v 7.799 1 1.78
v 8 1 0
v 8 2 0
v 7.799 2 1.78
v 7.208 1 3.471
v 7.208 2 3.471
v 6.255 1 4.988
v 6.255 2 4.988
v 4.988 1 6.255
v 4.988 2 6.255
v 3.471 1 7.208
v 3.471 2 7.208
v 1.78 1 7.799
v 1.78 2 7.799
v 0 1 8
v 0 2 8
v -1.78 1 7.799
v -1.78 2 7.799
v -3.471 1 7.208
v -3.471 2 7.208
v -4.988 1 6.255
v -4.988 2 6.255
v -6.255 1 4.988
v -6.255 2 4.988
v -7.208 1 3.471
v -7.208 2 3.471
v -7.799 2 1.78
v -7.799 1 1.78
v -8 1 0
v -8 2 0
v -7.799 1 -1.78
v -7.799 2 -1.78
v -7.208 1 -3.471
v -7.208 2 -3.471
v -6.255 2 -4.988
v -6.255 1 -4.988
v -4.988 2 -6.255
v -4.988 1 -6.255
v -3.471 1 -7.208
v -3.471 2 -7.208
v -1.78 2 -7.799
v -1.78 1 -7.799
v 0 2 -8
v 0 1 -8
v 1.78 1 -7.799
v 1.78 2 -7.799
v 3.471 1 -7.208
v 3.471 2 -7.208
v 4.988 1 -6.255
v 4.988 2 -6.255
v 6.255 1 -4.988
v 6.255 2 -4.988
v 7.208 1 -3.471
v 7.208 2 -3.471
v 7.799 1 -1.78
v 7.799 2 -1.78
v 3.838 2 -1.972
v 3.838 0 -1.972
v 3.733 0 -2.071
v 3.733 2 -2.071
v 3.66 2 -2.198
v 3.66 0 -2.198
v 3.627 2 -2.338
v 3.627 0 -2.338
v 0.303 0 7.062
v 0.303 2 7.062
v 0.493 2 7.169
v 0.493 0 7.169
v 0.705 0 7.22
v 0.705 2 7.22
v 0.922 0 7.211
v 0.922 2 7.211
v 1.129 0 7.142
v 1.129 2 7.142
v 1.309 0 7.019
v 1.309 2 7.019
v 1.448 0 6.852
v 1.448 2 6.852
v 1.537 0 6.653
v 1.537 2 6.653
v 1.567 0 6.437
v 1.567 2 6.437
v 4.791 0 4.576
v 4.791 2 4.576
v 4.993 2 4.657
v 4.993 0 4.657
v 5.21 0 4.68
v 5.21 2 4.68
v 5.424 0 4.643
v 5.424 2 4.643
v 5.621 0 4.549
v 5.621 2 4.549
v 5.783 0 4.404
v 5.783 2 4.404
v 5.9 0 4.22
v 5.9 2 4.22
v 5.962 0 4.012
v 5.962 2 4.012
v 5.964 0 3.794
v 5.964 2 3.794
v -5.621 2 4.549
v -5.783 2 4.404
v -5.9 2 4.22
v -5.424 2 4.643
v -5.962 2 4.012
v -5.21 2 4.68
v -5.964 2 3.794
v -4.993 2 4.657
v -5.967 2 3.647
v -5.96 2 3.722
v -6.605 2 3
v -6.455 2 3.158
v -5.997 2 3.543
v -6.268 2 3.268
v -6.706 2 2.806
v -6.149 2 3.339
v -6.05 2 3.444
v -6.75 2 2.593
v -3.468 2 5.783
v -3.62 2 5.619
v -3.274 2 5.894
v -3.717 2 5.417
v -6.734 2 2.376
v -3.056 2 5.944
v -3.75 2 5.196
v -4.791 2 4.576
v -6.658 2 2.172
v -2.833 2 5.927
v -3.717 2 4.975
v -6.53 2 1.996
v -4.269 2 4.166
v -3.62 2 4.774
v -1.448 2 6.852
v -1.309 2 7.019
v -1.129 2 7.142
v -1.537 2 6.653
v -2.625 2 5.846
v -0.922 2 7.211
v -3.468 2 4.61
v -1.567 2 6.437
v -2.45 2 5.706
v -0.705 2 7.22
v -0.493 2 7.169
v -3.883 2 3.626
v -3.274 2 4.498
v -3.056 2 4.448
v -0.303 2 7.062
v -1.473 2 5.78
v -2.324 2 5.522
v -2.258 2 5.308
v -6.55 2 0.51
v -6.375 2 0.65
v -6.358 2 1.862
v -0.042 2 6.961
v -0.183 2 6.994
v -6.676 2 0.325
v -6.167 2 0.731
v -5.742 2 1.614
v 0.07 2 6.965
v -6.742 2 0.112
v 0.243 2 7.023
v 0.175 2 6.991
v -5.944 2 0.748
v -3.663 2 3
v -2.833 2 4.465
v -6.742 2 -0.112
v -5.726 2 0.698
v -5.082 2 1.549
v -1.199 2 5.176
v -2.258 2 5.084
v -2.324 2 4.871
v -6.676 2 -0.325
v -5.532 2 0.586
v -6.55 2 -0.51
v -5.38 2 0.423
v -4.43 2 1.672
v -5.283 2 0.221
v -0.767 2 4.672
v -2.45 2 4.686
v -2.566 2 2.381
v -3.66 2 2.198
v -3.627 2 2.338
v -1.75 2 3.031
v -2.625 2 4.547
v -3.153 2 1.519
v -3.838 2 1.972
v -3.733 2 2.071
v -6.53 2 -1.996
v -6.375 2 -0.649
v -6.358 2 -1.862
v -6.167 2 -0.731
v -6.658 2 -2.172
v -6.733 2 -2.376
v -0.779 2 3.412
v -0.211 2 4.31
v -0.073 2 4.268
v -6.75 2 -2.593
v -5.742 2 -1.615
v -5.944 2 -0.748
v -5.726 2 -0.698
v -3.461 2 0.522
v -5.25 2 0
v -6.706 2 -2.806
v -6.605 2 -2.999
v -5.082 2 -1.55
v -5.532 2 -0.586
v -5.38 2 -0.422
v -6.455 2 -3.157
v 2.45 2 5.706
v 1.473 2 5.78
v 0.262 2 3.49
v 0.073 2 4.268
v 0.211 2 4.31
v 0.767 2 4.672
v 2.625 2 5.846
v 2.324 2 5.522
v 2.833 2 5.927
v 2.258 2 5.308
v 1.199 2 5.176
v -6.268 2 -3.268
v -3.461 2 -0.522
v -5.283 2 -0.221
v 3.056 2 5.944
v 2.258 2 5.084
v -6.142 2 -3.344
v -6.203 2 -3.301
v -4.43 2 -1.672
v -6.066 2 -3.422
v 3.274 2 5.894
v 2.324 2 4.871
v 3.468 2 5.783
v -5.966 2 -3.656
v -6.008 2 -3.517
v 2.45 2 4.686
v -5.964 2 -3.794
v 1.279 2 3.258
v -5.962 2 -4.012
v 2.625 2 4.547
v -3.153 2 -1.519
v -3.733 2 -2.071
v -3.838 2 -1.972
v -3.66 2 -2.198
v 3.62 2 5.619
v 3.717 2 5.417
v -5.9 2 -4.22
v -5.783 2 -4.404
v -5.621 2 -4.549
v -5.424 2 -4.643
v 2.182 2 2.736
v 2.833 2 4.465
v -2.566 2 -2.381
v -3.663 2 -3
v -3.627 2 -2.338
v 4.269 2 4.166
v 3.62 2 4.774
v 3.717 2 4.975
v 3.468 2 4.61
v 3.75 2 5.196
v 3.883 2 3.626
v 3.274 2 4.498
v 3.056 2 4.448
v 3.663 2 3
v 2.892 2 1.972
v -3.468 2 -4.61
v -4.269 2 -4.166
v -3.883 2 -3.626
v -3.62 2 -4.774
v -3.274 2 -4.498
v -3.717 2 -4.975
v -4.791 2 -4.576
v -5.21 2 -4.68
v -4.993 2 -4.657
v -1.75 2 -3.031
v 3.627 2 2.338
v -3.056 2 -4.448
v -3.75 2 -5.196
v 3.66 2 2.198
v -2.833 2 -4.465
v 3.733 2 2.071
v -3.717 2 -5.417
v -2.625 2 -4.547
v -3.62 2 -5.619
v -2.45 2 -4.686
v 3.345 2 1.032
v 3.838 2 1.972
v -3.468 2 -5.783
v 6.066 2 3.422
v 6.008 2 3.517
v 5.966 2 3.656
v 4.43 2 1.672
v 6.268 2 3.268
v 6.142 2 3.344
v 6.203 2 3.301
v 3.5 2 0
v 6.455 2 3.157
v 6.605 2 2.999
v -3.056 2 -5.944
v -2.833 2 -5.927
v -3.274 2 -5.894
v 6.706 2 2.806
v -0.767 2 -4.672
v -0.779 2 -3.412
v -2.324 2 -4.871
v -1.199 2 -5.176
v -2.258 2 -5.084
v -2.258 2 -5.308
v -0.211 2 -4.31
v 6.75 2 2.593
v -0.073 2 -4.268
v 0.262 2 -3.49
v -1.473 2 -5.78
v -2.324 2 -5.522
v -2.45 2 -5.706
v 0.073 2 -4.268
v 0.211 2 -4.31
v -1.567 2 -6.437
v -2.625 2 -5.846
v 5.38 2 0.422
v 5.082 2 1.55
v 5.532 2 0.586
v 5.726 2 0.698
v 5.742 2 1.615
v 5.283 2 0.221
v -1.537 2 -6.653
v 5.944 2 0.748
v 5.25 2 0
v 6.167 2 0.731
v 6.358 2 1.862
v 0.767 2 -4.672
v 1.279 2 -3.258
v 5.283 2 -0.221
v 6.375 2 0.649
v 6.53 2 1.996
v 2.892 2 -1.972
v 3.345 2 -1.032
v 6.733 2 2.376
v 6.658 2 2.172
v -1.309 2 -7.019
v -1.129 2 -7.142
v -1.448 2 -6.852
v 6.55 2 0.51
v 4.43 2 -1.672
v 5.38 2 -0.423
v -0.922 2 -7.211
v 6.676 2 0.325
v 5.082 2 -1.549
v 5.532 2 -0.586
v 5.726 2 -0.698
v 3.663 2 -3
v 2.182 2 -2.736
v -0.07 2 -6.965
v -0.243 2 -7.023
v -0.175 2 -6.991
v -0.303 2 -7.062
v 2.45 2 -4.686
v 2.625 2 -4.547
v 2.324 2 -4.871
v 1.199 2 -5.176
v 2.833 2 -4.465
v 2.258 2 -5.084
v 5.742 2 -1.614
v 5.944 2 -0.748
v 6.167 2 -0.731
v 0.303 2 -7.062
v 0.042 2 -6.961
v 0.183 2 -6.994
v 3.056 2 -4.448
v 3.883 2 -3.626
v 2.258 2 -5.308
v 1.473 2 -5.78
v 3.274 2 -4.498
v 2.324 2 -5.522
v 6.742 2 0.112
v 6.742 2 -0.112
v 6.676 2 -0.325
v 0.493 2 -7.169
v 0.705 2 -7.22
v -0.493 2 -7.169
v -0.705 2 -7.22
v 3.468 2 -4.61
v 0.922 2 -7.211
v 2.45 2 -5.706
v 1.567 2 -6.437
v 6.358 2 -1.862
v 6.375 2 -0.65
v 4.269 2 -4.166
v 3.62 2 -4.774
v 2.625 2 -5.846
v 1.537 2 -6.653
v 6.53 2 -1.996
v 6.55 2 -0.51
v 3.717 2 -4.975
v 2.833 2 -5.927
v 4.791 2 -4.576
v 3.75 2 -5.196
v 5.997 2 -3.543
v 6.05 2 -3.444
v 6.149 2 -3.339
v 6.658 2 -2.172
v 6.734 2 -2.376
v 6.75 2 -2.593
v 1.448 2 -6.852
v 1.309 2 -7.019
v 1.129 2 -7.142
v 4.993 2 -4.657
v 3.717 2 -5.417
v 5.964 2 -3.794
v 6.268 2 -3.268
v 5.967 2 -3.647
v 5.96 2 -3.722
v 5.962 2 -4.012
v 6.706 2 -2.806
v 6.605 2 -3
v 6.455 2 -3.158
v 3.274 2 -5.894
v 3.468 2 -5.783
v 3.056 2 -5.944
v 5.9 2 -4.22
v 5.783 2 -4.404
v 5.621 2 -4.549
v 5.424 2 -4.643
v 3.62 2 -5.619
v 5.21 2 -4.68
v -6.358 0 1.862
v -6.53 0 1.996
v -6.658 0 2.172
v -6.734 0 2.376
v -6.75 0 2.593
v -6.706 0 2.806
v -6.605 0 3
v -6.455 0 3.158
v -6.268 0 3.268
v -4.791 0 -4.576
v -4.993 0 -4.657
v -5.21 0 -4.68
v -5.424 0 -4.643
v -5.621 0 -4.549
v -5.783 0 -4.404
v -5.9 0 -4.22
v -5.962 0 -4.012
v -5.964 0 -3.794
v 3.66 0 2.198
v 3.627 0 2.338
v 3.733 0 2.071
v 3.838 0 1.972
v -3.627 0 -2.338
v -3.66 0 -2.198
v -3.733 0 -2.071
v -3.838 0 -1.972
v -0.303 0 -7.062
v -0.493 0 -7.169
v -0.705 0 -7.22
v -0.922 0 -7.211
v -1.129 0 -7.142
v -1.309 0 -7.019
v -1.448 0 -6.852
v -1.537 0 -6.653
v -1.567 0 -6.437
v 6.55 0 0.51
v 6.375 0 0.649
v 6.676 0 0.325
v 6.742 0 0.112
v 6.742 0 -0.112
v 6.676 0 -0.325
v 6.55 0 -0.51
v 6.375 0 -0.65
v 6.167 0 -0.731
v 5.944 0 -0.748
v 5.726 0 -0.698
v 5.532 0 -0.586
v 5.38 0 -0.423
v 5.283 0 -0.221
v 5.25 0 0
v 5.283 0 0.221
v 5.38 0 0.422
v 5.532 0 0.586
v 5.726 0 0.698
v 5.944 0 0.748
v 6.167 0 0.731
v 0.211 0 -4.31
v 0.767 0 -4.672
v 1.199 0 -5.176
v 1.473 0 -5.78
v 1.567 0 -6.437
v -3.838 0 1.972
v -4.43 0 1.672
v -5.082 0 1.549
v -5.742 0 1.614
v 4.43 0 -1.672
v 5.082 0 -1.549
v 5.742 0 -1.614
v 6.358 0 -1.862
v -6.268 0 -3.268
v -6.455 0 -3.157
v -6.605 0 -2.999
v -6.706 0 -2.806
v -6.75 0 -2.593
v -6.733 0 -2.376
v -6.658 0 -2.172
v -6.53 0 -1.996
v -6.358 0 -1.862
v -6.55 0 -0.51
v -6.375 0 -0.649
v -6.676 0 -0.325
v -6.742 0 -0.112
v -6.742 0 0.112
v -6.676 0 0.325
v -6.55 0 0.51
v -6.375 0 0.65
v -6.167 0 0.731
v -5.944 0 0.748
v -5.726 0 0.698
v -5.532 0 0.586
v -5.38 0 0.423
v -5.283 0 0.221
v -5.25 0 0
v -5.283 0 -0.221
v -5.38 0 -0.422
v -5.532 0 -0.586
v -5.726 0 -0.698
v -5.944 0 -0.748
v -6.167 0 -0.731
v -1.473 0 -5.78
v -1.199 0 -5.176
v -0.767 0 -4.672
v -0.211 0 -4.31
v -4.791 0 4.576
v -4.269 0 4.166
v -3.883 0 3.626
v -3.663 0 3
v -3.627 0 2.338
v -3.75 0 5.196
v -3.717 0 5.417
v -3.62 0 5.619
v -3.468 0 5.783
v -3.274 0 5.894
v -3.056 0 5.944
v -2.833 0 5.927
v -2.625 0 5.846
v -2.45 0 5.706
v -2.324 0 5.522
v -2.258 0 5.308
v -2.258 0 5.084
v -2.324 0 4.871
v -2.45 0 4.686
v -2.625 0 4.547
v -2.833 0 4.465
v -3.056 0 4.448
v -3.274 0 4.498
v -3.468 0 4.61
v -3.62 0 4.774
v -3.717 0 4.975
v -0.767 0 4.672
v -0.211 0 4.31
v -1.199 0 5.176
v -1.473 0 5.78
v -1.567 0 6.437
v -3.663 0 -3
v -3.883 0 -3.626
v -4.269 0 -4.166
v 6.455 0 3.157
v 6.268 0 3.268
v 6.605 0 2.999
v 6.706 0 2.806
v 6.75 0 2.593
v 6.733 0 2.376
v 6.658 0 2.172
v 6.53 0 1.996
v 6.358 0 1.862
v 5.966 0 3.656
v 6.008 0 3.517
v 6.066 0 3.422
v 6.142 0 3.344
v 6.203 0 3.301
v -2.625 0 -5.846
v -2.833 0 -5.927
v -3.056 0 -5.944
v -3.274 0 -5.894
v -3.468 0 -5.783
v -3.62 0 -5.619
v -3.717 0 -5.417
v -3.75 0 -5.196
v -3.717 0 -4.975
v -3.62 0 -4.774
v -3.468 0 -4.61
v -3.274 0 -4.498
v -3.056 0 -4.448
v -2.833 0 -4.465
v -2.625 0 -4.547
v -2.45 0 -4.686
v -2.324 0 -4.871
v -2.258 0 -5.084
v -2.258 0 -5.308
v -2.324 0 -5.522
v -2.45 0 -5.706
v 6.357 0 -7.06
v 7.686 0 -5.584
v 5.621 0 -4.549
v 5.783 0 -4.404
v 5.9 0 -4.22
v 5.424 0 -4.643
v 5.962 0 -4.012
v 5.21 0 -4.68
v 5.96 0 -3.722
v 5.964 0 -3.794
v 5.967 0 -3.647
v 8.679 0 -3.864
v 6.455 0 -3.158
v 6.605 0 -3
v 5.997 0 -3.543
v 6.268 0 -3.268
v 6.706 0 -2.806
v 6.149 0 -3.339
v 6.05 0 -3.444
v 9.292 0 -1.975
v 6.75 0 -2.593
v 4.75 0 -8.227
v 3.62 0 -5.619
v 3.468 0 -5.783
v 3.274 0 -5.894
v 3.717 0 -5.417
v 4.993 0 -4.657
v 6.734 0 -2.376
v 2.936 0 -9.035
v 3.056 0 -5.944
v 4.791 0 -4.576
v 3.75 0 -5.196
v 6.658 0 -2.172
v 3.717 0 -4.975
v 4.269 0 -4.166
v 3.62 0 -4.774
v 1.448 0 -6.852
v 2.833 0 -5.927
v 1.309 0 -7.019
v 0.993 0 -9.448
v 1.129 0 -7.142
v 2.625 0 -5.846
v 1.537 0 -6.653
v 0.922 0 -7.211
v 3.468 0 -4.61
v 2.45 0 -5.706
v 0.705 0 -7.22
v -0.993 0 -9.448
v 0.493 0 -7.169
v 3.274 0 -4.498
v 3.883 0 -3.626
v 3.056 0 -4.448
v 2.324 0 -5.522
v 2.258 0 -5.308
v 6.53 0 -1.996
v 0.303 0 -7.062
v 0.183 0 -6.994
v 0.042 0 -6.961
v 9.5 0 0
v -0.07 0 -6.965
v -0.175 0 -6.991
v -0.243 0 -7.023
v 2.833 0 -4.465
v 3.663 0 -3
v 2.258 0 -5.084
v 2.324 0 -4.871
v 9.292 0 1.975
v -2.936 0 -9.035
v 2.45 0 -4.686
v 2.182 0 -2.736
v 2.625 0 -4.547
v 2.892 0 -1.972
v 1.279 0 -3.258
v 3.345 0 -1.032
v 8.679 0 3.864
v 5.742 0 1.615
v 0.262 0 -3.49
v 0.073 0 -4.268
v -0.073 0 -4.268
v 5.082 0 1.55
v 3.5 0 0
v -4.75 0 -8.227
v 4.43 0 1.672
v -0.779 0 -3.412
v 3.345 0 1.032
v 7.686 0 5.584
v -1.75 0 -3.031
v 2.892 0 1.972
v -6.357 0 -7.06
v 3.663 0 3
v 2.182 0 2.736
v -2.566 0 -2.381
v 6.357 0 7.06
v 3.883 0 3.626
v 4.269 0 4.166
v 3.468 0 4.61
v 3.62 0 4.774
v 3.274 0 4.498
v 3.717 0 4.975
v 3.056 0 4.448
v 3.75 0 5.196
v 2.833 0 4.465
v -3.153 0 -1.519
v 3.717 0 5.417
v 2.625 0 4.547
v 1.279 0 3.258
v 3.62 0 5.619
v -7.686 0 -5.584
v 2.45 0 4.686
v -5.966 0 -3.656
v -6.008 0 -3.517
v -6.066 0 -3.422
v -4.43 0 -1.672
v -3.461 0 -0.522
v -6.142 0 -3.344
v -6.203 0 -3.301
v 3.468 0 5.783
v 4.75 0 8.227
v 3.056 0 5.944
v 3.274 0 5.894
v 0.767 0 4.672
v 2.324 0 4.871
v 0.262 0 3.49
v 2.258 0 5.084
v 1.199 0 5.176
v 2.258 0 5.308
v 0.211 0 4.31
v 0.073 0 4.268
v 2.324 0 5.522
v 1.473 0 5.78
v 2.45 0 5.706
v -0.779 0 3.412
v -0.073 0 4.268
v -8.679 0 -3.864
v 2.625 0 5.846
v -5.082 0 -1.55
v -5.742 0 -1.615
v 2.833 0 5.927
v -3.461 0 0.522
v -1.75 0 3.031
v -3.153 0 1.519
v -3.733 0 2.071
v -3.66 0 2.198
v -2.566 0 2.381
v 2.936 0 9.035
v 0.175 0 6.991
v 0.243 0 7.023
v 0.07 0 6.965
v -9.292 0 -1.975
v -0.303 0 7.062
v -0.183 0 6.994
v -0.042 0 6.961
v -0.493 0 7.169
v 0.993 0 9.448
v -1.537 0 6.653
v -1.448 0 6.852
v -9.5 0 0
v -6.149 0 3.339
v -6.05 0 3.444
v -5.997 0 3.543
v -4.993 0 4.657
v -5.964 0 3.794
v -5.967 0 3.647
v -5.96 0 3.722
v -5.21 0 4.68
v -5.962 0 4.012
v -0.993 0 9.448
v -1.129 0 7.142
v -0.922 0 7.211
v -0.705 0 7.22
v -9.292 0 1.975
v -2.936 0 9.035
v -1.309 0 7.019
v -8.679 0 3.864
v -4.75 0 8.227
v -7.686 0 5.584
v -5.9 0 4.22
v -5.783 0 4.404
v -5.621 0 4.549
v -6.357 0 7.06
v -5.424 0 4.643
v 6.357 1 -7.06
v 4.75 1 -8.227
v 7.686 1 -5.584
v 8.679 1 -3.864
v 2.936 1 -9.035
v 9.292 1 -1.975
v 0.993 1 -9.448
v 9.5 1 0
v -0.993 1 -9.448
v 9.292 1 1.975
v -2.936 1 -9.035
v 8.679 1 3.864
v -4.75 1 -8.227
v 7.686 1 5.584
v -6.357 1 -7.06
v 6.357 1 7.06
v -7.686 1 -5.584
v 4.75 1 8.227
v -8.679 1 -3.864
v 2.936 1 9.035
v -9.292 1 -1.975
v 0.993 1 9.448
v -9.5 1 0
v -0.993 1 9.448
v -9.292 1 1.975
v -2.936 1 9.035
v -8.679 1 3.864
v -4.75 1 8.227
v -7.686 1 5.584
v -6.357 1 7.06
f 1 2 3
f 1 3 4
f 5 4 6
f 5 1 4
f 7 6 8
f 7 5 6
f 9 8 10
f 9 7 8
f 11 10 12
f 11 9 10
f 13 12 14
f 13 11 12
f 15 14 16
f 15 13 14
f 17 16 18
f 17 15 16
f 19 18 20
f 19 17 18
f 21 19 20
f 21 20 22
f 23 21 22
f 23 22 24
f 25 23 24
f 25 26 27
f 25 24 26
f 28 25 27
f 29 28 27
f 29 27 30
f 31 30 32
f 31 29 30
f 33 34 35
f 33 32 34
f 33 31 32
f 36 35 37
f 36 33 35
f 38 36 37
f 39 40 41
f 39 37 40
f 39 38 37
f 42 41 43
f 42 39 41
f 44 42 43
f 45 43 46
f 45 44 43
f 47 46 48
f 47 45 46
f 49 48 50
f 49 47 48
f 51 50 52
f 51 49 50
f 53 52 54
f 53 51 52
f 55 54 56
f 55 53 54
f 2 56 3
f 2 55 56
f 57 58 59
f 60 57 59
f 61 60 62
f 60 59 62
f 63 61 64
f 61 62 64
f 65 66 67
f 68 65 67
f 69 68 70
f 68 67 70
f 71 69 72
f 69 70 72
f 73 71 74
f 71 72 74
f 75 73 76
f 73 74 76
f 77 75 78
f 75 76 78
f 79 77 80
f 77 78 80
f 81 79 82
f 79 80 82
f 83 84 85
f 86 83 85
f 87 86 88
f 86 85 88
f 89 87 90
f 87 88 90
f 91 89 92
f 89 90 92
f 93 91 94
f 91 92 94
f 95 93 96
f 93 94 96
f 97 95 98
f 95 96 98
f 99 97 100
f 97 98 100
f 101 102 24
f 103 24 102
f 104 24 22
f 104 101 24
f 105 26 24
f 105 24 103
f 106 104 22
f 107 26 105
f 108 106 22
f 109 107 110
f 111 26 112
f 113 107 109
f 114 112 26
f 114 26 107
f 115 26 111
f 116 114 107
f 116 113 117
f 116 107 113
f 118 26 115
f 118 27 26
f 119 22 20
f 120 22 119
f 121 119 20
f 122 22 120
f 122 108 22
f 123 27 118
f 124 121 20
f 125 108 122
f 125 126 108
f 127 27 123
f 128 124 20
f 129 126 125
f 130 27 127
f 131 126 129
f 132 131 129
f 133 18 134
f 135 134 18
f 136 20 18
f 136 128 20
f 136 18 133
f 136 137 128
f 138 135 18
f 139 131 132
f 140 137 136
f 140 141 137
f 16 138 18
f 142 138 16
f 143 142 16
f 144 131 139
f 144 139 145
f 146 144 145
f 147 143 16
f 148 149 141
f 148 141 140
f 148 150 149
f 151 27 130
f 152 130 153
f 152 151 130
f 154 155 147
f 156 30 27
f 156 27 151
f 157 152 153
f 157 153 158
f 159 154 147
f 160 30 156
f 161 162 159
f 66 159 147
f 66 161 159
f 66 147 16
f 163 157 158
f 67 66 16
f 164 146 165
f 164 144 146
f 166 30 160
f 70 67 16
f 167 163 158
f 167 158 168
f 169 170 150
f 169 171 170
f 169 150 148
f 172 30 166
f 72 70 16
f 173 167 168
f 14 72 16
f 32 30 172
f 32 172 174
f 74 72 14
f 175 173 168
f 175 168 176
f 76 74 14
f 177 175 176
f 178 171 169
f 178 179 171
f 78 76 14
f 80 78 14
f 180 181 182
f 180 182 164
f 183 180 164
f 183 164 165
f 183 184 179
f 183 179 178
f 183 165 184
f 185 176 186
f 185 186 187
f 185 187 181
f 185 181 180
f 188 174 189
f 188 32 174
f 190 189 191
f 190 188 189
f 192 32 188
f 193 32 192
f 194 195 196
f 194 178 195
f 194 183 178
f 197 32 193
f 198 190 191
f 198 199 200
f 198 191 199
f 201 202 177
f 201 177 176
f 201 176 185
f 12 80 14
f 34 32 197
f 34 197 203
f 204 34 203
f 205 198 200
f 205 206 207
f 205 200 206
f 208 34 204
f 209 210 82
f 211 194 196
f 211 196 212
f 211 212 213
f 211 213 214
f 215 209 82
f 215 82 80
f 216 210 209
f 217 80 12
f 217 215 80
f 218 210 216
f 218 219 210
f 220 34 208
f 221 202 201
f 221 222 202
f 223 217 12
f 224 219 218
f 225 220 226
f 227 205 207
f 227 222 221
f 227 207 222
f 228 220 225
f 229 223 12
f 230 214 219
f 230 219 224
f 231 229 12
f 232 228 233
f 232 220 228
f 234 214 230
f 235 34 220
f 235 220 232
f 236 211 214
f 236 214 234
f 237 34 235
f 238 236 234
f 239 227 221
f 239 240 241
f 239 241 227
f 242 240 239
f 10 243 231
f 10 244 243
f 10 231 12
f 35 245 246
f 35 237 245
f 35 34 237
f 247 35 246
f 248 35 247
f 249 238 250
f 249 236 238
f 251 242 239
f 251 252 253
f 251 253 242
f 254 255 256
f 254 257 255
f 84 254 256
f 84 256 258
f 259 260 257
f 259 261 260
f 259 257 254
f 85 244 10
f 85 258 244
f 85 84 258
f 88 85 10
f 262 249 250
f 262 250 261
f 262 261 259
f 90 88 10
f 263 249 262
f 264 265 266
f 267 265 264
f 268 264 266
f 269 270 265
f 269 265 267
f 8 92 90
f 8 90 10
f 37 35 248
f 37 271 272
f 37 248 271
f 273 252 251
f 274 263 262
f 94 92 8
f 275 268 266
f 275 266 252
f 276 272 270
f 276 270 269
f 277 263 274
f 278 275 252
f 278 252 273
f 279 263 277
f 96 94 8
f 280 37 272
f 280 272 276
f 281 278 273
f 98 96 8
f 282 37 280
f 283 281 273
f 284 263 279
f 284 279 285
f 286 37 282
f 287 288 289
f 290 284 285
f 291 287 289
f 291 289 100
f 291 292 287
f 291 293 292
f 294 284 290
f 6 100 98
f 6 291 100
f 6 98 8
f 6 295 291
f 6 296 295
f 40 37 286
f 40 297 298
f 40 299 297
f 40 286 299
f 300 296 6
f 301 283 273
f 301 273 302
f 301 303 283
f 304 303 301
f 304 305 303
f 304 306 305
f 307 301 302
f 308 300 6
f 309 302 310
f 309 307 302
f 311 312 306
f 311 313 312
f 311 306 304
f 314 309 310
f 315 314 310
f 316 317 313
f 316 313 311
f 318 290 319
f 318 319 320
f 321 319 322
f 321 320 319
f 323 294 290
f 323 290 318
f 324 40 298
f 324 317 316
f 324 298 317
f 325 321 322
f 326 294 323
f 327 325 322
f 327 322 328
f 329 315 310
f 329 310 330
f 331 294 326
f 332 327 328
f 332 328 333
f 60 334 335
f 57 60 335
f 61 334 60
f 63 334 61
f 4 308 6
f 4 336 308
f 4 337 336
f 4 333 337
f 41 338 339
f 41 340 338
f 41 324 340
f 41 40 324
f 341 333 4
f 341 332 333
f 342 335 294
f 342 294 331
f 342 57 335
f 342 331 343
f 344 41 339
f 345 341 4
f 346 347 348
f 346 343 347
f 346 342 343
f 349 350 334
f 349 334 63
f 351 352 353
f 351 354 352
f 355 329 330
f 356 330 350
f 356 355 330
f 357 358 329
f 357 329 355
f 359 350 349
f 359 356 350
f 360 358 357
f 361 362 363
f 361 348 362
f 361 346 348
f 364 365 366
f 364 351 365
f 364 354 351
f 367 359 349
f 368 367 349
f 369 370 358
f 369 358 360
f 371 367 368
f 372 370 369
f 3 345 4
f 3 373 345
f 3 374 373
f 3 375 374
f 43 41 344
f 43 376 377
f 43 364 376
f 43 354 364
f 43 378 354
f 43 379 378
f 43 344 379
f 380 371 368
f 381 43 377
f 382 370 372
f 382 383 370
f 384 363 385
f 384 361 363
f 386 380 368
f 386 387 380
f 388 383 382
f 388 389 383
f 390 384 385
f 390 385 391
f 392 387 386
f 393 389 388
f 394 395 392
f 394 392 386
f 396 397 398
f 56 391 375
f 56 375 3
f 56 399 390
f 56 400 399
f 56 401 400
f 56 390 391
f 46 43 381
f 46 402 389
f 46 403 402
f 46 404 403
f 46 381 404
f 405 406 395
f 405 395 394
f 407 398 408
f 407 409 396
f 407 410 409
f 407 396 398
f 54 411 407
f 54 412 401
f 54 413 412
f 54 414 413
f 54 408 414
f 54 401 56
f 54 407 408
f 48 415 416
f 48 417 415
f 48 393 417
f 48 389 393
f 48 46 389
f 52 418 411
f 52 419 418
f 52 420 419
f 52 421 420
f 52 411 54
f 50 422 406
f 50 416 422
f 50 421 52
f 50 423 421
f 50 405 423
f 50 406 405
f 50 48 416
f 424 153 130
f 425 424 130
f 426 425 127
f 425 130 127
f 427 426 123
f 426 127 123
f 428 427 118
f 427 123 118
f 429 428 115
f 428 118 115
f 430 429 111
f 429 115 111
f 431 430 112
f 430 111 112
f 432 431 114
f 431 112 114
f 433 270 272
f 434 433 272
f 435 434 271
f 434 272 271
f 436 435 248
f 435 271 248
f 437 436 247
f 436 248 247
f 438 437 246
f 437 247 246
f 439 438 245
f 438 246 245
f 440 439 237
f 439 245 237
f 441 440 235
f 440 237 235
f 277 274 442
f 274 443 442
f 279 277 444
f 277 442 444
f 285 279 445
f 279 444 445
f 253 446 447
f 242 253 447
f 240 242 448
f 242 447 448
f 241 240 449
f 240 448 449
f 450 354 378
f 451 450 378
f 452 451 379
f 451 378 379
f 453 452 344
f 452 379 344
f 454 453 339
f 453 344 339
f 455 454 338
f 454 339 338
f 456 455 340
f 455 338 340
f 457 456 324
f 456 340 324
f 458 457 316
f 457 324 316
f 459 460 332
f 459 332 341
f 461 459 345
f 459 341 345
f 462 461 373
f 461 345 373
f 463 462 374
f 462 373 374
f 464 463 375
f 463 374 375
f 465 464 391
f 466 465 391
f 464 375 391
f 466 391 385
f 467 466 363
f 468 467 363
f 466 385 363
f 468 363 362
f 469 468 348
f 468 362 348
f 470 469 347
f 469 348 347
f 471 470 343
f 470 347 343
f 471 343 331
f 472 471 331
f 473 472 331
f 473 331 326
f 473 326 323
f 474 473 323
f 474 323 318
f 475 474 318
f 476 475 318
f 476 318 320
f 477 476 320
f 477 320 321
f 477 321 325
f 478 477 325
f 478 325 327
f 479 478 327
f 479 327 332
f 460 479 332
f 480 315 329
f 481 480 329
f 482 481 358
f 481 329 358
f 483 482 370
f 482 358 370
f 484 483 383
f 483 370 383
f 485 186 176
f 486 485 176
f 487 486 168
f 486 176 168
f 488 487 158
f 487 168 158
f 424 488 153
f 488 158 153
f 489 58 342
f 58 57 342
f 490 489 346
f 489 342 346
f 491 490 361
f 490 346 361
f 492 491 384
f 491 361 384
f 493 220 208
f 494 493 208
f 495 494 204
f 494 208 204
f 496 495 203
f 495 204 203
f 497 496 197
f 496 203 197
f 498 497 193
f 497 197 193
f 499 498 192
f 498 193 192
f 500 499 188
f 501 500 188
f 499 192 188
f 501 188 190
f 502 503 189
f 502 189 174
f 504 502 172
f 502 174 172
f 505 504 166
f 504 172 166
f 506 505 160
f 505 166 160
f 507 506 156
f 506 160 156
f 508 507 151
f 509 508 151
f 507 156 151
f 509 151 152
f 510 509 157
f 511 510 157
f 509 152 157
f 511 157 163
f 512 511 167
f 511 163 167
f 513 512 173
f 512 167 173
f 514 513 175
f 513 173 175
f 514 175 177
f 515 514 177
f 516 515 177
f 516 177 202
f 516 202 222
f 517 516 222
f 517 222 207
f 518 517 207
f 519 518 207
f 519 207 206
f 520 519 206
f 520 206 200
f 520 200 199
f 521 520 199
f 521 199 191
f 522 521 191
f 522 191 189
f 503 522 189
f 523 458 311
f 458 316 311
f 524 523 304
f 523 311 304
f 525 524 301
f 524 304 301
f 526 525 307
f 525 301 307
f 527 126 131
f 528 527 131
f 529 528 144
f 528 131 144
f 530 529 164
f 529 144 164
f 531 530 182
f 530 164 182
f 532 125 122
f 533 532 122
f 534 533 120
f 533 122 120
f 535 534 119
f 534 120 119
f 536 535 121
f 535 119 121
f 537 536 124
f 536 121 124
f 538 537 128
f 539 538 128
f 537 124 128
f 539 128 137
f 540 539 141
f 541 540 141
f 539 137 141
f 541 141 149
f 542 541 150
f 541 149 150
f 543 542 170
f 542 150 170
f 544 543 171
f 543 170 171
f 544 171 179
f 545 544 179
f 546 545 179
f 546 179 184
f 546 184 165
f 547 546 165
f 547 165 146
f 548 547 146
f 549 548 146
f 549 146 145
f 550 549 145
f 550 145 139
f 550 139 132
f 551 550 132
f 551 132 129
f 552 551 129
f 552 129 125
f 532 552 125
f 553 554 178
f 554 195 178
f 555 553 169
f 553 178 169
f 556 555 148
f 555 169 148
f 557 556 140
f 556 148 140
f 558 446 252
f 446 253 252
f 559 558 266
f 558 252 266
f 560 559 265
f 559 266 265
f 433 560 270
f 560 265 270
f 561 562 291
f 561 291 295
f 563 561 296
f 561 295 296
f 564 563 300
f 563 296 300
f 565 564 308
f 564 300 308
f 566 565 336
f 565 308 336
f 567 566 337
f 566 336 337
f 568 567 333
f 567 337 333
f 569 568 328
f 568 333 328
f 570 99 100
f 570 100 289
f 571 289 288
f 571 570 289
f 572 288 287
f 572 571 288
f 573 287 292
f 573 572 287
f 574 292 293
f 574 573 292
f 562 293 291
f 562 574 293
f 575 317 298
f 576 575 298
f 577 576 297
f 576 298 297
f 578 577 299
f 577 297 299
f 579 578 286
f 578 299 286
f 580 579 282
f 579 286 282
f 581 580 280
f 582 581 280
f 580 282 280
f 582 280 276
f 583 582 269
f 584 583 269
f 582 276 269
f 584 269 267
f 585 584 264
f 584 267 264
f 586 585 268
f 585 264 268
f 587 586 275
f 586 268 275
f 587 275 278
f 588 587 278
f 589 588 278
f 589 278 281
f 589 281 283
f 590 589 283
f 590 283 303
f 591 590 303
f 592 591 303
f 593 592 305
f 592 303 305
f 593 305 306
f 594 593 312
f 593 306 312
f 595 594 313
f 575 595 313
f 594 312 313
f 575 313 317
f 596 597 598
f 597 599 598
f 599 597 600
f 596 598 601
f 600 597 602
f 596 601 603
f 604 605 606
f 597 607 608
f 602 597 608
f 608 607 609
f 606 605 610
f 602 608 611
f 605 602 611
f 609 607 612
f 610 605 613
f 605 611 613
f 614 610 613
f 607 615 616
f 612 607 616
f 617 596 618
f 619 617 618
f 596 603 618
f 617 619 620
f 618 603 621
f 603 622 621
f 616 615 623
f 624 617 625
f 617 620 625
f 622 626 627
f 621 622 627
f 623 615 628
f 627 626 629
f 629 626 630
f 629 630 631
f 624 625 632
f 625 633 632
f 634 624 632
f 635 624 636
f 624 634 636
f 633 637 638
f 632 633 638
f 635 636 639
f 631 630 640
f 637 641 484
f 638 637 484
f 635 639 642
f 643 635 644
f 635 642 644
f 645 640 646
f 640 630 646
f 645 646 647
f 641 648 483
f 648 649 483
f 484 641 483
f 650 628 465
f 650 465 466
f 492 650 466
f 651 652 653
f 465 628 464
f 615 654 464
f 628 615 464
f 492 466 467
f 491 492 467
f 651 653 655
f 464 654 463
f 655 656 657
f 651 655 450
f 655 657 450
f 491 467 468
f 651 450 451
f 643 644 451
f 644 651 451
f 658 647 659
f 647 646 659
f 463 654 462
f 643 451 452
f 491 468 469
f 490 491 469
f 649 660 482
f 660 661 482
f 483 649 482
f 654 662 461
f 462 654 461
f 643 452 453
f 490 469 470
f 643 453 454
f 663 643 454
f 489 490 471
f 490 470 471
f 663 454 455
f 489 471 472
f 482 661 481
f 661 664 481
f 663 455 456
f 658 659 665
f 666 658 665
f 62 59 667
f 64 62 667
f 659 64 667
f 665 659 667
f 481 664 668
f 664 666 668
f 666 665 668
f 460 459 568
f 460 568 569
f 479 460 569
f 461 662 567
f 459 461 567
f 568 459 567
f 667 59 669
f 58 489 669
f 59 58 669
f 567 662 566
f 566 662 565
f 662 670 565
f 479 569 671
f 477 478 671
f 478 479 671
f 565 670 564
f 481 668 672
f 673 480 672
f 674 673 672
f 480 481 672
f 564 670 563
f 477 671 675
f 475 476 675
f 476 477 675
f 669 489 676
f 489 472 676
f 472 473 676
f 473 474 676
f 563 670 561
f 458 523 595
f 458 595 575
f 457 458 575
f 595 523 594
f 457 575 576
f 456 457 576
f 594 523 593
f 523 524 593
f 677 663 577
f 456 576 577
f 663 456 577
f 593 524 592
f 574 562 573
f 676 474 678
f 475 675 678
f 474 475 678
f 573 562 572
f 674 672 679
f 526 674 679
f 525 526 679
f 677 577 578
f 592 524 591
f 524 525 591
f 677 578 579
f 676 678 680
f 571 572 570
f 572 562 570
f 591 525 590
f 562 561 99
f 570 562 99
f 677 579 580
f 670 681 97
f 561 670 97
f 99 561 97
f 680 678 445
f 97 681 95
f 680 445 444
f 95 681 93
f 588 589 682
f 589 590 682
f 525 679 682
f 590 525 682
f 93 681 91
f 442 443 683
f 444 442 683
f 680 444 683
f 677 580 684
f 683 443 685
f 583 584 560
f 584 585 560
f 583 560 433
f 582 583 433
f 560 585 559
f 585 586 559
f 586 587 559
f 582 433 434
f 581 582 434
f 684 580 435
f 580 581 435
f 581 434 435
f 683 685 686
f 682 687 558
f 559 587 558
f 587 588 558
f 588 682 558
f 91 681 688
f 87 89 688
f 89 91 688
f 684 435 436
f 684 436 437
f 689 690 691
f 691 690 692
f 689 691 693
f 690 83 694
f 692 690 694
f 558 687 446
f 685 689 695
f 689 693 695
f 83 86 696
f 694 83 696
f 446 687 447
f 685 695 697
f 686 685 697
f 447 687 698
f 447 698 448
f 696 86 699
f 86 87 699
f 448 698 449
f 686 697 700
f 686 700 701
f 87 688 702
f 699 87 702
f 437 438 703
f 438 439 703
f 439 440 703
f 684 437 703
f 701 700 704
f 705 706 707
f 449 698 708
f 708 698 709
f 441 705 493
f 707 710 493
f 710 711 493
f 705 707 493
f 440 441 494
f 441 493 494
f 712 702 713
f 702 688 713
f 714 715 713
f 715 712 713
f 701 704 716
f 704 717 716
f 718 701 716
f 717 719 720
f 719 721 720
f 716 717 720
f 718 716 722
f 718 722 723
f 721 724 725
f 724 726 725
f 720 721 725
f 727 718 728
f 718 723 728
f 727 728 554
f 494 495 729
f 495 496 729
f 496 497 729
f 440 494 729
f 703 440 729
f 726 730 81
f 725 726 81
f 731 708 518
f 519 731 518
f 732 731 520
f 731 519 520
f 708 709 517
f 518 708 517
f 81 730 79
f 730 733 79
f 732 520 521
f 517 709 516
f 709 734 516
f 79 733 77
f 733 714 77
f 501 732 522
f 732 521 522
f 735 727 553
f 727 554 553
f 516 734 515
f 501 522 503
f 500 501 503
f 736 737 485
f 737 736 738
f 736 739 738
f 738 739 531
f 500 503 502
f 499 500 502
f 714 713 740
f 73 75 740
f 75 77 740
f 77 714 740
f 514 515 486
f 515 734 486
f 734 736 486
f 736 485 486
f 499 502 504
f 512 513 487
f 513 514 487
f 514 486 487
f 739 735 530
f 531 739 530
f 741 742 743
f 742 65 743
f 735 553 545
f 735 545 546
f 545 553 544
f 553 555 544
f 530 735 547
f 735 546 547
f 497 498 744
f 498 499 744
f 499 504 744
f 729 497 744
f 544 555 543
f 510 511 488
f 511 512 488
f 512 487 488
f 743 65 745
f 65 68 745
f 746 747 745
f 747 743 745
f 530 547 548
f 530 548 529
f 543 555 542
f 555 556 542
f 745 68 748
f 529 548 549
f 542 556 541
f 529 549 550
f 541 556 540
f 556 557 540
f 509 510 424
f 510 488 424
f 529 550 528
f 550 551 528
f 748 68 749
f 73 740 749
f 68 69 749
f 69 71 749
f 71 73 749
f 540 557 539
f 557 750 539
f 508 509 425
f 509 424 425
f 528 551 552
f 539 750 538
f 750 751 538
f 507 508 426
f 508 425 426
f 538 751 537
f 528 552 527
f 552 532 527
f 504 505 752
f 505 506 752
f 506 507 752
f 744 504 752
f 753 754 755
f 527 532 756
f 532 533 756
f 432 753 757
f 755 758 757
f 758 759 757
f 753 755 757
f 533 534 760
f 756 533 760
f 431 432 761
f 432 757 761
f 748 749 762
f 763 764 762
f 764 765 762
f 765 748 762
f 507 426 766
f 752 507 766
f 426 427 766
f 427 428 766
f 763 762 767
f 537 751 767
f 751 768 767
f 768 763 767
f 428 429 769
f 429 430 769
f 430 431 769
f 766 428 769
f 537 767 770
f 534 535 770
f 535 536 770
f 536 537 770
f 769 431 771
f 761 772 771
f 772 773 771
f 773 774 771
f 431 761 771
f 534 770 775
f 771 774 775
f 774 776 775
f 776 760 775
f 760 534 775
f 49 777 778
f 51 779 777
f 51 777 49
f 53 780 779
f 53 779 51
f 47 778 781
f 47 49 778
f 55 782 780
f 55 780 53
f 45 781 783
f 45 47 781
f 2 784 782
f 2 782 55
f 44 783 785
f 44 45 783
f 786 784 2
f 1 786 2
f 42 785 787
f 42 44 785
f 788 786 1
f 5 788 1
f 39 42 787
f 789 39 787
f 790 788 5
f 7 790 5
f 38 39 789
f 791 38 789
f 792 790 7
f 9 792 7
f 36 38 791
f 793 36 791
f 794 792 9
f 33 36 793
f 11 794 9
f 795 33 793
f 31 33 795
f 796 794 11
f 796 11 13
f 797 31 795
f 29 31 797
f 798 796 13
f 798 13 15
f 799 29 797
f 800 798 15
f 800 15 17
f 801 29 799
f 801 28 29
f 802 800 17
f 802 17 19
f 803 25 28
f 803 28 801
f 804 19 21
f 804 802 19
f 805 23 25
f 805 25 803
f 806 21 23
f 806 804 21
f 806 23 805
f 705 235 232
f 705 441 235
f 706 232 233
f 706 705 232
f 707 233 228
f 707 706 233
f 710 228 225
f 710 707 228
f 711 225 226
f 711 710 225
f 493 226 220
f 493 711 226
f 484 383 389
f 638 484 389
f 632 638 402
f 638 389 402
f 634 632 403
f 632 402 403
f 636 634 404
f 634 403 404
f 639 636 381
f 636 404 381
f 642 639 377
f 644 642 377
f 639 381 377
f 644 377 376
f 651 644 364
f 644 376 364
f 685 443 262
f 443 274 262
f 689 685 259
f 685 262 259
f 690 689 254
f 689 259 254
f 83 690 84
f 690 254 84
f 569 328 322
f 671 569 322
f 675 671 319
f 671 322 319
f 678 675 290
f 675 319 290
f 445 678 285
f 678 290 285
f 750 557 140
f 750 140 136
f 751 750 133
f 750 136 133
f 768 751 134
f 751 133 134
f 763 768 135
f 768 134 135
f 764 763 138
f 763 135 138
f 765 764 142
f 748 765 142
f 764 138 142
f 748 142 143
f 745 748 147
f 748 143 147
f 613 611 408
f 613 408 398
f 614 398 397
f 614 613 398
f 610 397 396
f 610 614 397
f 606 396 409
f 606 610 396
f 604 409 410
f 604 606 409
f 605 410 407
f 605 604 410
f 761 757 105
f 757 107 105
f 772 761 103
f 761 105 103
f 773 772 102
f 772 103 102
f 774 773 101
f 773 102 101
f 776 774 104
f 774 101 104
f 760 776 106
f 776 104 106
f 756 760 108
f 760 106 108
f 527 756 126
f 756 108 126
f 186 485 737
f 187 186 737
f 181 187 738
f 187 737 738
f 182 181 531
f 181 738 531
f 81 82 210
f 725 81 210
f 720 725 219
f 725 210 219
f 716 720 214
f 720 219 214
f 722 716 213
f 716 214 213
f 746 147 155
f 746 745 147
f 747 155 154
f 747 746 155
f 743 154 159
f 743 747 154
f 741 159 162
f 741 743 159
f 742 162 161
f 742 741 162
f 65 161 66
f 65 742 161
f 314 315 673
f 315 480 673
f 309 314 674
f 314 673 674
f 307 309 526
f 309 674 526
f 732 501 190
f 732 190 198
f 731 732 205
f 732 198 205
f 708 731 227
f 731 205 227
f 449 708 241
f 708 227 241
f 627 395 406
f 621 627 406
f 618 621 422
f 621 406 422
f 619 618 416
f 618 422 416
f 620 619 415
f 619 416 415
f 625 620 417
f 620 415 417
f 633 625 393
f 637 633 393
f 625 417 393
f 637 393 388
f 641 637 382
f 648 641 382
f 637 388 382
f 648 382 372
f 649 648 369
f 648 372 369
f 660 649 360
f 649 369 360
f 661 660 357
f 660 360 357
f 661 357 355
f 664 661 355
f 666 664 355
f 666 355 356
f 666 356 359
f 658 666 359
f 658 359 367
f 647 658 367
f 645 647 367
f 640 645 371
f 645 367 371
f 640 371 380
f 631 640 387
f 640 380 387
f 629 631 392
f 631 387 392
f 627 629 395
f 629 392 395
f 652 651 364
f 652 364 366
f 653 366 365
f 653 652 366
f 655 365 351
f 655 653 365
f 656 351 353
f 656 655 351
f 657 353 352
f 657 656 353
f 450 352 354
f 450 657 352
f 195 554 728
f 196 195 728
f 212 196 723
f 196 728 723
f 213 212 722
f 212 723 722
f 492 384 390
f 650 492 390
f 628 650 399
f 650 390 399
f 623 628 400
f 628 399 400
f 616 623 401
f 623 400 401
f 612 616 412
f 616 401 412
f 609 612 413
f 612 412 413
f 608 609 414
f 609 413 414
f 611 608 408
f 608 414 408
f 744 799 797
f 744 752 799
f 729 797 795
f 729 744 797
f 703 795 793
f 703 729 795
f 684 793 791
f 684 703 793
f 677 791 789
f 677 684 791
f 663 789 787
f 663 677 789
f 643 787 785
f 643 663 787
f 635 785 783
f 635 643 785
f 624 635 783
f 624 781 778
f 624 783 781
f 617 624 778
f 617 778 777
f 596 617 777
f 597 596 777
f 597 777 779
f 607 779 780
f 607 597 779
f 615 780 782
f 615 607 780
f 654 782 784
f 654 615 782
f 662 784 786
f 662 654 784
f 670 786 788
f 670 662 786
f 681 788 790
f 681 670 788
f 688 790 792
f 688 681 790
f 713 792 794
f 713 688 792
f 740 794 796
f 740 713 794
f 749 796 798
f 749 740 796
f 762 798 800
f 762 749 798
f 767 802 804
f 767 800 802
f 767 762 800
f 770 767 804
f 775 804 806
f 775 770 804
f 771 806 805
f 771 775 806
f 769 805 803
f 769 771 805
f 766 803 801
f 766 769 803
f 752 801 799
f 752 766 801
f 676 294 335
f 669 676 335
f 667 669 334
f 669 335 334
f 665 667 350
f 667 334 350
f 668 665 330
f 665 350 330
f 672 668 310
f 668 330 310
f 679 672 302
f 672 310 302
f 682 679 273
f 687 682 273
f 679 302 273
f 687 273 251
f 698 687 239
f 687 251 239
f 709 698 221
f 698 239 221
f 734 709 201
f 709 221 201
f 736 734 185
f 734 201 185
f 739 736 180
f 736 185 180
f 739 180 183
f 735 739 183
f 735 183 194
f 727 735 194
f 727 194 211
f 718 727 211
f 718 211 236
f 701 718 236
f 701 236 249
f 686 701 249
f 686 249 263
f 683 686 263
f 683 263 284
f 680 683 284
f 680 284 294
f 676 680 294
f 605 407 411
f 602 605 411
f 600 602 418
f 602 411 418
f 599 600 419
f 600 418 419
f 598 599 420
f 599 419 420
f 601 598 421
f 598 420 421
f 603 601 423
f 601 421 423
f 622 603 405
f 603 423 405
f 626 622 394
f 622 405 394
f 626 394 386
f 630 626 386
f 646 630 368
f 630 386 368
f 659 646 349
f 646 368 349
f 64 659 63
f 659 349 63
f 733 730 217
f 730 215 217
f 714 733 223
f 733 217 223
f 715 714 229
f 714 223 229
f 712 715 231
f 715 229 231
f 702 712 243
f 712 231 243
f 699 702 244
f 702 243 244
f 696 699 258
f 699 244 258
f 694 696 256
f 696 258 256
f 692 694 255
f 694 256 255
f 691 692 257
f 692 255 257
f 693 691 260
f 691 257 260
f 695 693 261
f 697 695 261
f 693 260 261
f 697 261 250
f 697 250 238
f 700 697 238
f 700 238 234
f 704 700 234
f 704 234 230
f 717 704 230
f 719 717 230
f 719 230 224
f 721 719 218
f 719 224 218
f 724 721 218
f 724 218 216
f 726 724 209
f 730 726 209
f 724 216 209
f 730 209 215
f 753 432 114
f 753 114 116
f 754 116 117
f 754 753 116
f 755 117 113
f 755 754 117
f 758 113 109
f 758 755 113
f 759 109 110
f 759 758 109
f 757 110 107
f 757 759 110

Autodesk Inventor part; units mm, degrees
ref_plane "YZ Plane" through (0, 0, 0) normal (1, 0, 0) x (0, 1, 0)
ref_plane "XZ Plane" through (0, 0, 0) normal (0, 1, 0) x (-1, 0, 0)
ref_plane "XY Plane" through (0, 0, 0) normal (0, 0, 1) x (1, 0, 0)
sketch "スケッチ1" plane through (0, 0, 0) normal (0, 1, 0) x (-1, 0, 0)
  circle A0 centre (0, 0) radius 9.5
  dimension "d0" = 19
extrude "押し出し1" add sketch "スケッチ1" along normal blind 1
sketch "スケッチ2" plane through (0, 1, 0) normal (0, 1, 0) x (1, 0, 0)
  circle A0 centre (0, 0) radius 8
  dimension "d4" = 16
extrude "押し出し2" add sketch "スケッチ2" along normal blind 1
sketch "スケッチ4" plane through (0, 2, 0) normal (0, 1, 0) x (1, 0, 0)
  circle A0 centre (0, 0) radius 3.5
  dimension "d20" = 7
extrude "押し出し4" cut sketch "スケッチ4" against normal blind 10
sketch "スケッチ5" plane through (0, 2, 0) normal (0, 1, 0) x (1, 0, 0)
  arc A0 (1.5668, 6.4373) -> (0, 6.5319) centre (0.7805, 6.4373) ccw
  arc A1 (0, 4.2235) -> (1.5668, 6.4373) centre (-0.7805, 6.4373) ccw
  line L0 (0, 6.5319) -> (0, 4.2235)
  line L1 (0.7805, 6.4373) -> (0, 6.4373) construction
  line L2 (-0.7805, 6.4373) -> (0, 6.4373) construction
  line L3 (1.5668, 4.5823) -> (1.5668, 2.8488) construction
  line L4 (1.5668, 5.2864) -> (1.5668, 3.0604) construction
  line L5 (-0.8113, 7.2235) -> (2.563, 7.2235) construction
  line L6 (0.8759, 7.2235) -> (0.963, 7.9418) construction
  line L7 (0, 4.2235) -> (0, 3.5) construction
  circle A2 centre (0, 0) radius 3.5 construction
  circle A3 centre (0, 0) radius 8 construction
  line L8 (-0.0717, 5.941) -> (0.1752, 7.9769) construction
  arc A4 (0, 6.5319) -> (-1.5668, 6.4373) centre (-0.7805, 6.4373) ccw
  arc A5 (-1.5668, 6.4373) -> (0, 4.2235) centre (0.7805, 6.4373) ccw
  circle A6 centre (3, 5.1962) radius 0.75
  circle A7 centre (0, 0) radius 6 construction
  dimension "d33" = 12
  dimension "d24" = 3
  dimension "d31" = 1.5
  dimension "d32" = 30
extrude "押し出し5" cut sketch "スケッチ5" against normal blind 10
fillet "フィレット1" radius 0.5 2 edges at (0, 1, -6.5319) (0, 1, -4.2235)
pattern_circular "円形状パターン1" count 6 over 360 about axis through (0, -10, 0) along (0, 1, 0) of "押し出し5", "フィレット1"
properties part number "wheelcap" material "ABS プラスチック"
